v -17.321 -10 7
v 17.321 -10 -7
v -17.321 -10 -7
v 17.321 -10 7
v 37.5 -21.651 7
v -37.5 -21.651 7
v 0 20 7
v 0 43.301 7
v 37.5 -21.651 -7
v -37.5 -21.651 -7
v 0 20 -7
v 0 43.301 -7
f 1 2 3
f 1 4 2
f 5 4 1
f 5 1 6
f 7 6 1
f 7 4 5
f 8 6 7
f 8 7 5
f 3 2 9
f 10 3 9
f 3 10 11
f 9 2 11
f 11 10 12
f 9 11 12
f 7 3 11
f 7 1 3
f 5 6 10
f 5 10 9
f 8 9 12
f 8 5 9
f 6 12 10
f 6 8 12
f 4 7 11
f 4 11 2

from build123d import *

# Parameters (mm, degrees)
F1_DEPTH = 7


with BuildPart() as f1:
    # F0 (on Top) → F1 (new body, symmetric)
    with BuildSketch(Plane.XY):
        Polygon((0, 43.30127), (-37.5, -21.650635), (37.5, -21.650635), align=None)
        Polygon((0, 20), (17.320508, -10), (-17.320508, -10), align=None, mode=Mode.SUBTRACT)
    extrude(amount=F1_DEPTH, both=True)


solid = f1.part
